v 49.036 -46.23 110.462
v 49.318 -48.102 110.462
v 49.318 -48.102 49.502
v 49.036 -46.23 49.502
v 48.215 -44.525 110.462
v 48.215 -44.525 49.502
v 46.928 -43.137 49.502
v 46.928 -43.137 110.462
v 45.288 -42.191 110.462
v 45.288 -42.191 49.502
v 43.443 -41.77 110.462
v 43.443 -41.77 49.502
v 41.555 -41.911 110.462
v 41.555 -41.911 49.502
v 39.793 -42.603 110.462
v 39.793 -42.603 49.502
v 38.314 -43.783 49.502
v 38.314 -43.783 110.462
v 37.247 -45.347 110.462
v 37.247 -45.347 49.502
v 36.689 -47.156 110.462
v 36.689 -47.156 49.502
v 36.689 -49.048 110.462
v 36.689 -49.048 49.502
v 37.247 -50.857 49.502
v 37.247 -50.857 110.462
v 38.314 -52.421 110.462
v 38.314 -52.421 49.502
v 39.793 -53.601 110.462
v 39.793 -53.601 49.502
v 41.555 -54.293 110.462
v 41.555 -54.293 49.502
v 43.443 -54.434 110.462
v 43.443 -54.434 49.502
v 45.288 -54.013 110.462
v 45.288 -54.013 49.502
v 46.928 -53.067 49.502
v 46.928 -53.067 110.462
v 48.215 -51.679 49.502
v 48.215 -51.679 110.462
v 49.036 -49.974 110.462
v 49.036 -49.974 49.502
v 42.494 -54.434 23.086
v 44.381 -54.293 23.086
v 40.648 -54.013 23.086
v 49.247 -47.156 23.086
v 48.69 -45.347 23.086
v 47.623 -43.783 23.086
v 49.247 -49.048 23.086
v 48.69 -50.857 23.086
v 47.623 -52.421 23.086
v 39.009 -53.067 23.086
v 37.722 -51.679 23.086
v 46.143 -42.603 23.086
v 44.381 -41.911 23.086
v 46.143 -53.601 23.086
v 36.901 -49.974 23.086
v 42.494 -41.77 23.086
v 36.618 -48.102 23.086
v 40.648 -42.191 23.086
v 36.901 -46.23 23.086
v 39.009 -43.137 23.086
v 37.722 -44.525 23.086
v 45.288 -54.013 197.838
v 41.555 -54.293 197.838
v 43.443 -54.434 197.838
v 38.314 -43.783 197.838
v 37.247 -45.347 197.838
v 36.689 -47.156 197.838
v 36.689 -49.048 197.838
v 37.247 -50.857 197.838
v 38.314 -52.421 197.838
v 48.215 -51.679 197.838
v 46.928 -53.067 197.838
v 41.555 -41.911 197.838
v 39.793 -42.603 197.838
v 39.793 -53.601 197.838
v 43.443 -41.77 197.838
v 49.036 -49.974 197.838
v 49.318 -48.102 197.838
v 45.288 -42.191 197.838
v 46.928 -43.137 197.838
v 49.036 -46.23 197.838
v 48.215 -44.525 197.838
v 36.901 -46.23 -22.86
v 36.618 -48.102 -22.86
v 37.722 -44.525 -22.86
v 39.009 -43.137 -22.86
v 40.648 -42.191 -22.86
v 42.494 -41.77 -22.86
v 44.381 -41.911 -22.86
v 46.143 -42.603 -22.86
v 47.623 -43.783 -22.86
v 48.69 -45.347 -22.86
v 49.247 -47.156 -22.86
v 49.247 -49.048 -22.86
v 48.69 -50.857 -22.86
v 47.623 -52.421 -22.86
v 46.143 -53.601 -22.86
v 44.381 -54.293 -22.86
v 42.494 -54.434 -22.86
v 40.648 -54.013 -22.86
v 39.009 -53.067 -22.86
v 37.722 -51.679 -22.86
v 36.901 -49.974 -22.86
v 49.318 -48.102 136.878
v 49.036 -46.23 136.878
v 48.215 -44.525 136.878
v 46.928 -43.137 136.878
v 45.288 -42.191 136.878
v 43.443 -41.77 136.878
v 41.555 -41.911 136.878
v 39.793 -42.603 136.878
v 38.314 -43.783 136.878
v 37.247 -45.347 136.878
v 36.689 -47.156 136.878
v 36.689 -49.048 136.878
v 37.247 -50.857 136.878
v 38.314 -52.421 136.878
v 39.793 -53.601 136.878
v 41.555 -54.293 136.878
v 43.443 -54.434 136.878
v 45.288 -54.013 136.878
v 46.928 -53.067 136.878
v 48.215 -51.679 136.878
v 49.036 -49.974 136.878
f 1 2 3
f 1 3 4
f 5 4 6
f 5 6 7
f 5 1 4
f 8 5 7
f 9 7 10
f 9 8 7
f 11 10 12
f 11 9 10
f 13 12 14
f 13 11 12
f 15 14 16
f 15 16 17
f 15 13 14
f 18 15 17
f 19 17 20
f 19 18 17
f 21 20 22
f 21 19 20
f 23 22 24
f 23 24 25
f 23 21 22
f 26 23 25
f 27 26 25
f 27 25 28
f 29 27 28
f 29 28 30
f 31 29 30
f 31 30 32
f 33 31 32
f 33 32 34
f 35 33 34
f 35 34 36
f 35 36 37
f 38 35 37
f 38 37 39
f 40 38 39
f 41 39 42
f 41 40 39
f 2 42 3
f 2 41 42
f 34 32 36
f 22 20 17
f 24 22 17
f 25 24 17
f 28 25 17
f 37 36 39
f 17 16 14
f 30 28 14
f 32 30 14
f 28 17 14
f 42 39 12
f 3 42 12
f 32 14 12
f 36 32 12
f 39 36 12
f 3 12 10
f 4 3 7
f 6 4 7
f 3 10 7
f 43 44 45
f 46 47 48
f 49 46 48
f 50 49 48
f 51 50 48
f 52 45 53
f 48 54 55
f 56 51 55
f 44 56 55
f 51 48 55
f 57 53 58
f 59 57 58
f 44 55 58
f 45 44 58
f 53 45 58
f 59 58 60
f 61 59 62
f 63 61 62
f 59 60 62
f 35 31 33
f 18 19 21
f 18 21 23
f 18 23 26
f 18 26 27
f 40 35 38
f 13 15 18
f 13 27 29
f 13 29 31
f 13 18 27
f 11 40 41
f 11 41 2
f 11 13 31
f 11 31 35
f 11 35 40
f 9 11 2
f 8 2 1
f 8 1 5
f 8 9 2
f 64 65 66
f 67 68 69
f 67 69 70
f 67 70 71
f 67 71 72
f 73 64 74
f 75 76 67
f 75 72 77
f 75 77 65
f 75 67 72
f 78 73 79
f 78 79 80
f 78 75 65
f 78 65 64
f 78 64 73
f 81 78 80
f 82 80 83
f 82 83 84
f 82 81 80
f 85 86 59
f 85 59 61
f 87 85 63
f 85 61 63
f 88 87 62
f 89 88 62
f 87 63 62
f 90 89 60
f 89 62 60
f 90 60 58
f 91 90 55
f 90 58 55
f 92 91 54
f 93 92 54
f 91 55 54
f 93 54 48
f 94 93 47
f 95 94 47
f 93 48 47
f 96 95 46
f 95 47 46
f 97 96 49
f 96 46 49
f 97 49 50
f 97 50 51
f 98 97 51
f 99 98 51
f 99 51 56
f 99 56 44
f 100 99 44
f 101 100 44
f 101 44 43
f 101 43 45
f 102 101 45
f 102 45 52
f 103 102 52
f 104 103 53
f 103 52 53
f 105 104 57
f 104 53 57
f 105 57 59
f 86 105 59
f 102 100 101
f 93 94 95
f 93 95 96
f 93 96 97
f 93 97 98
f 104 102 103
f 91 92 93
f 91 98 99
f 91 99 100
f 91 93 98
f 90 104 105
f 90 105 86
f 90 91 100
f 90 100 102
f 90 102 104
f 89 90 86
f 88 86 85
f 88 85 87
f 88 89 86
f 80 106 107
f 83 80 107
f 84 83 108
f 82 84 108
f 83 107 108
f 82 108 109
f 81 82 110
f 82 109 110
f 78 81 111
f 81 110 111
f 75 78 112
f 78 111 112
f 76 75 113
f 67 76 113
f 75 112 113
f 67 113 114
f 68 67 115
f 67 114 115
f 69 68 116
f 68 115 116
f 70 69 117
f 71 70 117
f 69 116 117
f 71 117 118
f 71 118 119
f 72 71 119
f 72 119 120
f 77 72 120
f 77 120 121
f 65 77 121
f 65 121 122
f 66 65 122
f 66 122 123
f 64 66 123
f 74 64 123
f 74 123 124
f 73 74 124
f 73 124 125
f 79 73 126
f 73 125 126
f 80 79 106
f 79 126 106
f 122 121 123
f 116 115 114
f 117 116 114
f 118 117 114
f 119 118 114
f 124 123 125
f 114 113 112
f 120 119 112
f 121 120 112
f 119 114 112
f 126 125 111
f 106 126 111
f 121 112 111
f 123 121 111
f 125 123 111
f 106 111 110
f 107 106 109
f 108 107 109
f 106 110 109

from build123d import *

# Parameters (mm, degrees)
BOSS_EXTRUDE1_START     = -60.96
BOSS_EXTRUDE1_OUTLINE_R = 6.35
BOSS_EXTRUDE1_DEPTH     = 60.96
SKETCH3_R               = 6.35
BOSS_EXTRUDE2_DEPTH     = 60.96
SKETCH4_R               = 6.35
BOSS_EXTRUDE3_DEPTH     = 45.946272956


# Read off the part's stored shape, not the designer's step: Boss-Extrude1
with BuildPart() as part:
    # Boss-Extrude1 outline → Boss-Extrude1 (new body)
    with BuildSketch(Plane.XY.offset(197.838272956).offset(BOSS_EXTRUDE1_START)):
        with Locations((42.968393667, -48.101963299)):
            Circle(BOSS_EXTRUDE1_OUTLINE_R)
    extrude(amount=BOSS_EXTRUDE1_DEPTH)


with BuildPart() as body_2:
    # Sketch3 → Boss-Extrude2 (new body)
    with BuildSketch(Plane.XY.offset(110.462272956)):
        with Locations((42.968393667, -48.101963299)):
            Circle(SKETCH3_R)
    extrude(amount=-BOSS_EXTRUDE2_DEPTH)


with BuildPart() as body_3:
    # Sketch4 → Boss-Extrude3 (new body)
    with BuildSketch(Plane(origin=(0, 0, 23.086272956), x_dir=(-1, 0, 0), z_dir=(0, 0, -1))):
        with Locations((-42.968393667, -48.101963299)):
            Circle(SKETCH4_R)
    extrude(amount=BOSS_EXTRUDE3_DEPTH)


solid = Compound([part.part, body_2.part, body_3.part])
